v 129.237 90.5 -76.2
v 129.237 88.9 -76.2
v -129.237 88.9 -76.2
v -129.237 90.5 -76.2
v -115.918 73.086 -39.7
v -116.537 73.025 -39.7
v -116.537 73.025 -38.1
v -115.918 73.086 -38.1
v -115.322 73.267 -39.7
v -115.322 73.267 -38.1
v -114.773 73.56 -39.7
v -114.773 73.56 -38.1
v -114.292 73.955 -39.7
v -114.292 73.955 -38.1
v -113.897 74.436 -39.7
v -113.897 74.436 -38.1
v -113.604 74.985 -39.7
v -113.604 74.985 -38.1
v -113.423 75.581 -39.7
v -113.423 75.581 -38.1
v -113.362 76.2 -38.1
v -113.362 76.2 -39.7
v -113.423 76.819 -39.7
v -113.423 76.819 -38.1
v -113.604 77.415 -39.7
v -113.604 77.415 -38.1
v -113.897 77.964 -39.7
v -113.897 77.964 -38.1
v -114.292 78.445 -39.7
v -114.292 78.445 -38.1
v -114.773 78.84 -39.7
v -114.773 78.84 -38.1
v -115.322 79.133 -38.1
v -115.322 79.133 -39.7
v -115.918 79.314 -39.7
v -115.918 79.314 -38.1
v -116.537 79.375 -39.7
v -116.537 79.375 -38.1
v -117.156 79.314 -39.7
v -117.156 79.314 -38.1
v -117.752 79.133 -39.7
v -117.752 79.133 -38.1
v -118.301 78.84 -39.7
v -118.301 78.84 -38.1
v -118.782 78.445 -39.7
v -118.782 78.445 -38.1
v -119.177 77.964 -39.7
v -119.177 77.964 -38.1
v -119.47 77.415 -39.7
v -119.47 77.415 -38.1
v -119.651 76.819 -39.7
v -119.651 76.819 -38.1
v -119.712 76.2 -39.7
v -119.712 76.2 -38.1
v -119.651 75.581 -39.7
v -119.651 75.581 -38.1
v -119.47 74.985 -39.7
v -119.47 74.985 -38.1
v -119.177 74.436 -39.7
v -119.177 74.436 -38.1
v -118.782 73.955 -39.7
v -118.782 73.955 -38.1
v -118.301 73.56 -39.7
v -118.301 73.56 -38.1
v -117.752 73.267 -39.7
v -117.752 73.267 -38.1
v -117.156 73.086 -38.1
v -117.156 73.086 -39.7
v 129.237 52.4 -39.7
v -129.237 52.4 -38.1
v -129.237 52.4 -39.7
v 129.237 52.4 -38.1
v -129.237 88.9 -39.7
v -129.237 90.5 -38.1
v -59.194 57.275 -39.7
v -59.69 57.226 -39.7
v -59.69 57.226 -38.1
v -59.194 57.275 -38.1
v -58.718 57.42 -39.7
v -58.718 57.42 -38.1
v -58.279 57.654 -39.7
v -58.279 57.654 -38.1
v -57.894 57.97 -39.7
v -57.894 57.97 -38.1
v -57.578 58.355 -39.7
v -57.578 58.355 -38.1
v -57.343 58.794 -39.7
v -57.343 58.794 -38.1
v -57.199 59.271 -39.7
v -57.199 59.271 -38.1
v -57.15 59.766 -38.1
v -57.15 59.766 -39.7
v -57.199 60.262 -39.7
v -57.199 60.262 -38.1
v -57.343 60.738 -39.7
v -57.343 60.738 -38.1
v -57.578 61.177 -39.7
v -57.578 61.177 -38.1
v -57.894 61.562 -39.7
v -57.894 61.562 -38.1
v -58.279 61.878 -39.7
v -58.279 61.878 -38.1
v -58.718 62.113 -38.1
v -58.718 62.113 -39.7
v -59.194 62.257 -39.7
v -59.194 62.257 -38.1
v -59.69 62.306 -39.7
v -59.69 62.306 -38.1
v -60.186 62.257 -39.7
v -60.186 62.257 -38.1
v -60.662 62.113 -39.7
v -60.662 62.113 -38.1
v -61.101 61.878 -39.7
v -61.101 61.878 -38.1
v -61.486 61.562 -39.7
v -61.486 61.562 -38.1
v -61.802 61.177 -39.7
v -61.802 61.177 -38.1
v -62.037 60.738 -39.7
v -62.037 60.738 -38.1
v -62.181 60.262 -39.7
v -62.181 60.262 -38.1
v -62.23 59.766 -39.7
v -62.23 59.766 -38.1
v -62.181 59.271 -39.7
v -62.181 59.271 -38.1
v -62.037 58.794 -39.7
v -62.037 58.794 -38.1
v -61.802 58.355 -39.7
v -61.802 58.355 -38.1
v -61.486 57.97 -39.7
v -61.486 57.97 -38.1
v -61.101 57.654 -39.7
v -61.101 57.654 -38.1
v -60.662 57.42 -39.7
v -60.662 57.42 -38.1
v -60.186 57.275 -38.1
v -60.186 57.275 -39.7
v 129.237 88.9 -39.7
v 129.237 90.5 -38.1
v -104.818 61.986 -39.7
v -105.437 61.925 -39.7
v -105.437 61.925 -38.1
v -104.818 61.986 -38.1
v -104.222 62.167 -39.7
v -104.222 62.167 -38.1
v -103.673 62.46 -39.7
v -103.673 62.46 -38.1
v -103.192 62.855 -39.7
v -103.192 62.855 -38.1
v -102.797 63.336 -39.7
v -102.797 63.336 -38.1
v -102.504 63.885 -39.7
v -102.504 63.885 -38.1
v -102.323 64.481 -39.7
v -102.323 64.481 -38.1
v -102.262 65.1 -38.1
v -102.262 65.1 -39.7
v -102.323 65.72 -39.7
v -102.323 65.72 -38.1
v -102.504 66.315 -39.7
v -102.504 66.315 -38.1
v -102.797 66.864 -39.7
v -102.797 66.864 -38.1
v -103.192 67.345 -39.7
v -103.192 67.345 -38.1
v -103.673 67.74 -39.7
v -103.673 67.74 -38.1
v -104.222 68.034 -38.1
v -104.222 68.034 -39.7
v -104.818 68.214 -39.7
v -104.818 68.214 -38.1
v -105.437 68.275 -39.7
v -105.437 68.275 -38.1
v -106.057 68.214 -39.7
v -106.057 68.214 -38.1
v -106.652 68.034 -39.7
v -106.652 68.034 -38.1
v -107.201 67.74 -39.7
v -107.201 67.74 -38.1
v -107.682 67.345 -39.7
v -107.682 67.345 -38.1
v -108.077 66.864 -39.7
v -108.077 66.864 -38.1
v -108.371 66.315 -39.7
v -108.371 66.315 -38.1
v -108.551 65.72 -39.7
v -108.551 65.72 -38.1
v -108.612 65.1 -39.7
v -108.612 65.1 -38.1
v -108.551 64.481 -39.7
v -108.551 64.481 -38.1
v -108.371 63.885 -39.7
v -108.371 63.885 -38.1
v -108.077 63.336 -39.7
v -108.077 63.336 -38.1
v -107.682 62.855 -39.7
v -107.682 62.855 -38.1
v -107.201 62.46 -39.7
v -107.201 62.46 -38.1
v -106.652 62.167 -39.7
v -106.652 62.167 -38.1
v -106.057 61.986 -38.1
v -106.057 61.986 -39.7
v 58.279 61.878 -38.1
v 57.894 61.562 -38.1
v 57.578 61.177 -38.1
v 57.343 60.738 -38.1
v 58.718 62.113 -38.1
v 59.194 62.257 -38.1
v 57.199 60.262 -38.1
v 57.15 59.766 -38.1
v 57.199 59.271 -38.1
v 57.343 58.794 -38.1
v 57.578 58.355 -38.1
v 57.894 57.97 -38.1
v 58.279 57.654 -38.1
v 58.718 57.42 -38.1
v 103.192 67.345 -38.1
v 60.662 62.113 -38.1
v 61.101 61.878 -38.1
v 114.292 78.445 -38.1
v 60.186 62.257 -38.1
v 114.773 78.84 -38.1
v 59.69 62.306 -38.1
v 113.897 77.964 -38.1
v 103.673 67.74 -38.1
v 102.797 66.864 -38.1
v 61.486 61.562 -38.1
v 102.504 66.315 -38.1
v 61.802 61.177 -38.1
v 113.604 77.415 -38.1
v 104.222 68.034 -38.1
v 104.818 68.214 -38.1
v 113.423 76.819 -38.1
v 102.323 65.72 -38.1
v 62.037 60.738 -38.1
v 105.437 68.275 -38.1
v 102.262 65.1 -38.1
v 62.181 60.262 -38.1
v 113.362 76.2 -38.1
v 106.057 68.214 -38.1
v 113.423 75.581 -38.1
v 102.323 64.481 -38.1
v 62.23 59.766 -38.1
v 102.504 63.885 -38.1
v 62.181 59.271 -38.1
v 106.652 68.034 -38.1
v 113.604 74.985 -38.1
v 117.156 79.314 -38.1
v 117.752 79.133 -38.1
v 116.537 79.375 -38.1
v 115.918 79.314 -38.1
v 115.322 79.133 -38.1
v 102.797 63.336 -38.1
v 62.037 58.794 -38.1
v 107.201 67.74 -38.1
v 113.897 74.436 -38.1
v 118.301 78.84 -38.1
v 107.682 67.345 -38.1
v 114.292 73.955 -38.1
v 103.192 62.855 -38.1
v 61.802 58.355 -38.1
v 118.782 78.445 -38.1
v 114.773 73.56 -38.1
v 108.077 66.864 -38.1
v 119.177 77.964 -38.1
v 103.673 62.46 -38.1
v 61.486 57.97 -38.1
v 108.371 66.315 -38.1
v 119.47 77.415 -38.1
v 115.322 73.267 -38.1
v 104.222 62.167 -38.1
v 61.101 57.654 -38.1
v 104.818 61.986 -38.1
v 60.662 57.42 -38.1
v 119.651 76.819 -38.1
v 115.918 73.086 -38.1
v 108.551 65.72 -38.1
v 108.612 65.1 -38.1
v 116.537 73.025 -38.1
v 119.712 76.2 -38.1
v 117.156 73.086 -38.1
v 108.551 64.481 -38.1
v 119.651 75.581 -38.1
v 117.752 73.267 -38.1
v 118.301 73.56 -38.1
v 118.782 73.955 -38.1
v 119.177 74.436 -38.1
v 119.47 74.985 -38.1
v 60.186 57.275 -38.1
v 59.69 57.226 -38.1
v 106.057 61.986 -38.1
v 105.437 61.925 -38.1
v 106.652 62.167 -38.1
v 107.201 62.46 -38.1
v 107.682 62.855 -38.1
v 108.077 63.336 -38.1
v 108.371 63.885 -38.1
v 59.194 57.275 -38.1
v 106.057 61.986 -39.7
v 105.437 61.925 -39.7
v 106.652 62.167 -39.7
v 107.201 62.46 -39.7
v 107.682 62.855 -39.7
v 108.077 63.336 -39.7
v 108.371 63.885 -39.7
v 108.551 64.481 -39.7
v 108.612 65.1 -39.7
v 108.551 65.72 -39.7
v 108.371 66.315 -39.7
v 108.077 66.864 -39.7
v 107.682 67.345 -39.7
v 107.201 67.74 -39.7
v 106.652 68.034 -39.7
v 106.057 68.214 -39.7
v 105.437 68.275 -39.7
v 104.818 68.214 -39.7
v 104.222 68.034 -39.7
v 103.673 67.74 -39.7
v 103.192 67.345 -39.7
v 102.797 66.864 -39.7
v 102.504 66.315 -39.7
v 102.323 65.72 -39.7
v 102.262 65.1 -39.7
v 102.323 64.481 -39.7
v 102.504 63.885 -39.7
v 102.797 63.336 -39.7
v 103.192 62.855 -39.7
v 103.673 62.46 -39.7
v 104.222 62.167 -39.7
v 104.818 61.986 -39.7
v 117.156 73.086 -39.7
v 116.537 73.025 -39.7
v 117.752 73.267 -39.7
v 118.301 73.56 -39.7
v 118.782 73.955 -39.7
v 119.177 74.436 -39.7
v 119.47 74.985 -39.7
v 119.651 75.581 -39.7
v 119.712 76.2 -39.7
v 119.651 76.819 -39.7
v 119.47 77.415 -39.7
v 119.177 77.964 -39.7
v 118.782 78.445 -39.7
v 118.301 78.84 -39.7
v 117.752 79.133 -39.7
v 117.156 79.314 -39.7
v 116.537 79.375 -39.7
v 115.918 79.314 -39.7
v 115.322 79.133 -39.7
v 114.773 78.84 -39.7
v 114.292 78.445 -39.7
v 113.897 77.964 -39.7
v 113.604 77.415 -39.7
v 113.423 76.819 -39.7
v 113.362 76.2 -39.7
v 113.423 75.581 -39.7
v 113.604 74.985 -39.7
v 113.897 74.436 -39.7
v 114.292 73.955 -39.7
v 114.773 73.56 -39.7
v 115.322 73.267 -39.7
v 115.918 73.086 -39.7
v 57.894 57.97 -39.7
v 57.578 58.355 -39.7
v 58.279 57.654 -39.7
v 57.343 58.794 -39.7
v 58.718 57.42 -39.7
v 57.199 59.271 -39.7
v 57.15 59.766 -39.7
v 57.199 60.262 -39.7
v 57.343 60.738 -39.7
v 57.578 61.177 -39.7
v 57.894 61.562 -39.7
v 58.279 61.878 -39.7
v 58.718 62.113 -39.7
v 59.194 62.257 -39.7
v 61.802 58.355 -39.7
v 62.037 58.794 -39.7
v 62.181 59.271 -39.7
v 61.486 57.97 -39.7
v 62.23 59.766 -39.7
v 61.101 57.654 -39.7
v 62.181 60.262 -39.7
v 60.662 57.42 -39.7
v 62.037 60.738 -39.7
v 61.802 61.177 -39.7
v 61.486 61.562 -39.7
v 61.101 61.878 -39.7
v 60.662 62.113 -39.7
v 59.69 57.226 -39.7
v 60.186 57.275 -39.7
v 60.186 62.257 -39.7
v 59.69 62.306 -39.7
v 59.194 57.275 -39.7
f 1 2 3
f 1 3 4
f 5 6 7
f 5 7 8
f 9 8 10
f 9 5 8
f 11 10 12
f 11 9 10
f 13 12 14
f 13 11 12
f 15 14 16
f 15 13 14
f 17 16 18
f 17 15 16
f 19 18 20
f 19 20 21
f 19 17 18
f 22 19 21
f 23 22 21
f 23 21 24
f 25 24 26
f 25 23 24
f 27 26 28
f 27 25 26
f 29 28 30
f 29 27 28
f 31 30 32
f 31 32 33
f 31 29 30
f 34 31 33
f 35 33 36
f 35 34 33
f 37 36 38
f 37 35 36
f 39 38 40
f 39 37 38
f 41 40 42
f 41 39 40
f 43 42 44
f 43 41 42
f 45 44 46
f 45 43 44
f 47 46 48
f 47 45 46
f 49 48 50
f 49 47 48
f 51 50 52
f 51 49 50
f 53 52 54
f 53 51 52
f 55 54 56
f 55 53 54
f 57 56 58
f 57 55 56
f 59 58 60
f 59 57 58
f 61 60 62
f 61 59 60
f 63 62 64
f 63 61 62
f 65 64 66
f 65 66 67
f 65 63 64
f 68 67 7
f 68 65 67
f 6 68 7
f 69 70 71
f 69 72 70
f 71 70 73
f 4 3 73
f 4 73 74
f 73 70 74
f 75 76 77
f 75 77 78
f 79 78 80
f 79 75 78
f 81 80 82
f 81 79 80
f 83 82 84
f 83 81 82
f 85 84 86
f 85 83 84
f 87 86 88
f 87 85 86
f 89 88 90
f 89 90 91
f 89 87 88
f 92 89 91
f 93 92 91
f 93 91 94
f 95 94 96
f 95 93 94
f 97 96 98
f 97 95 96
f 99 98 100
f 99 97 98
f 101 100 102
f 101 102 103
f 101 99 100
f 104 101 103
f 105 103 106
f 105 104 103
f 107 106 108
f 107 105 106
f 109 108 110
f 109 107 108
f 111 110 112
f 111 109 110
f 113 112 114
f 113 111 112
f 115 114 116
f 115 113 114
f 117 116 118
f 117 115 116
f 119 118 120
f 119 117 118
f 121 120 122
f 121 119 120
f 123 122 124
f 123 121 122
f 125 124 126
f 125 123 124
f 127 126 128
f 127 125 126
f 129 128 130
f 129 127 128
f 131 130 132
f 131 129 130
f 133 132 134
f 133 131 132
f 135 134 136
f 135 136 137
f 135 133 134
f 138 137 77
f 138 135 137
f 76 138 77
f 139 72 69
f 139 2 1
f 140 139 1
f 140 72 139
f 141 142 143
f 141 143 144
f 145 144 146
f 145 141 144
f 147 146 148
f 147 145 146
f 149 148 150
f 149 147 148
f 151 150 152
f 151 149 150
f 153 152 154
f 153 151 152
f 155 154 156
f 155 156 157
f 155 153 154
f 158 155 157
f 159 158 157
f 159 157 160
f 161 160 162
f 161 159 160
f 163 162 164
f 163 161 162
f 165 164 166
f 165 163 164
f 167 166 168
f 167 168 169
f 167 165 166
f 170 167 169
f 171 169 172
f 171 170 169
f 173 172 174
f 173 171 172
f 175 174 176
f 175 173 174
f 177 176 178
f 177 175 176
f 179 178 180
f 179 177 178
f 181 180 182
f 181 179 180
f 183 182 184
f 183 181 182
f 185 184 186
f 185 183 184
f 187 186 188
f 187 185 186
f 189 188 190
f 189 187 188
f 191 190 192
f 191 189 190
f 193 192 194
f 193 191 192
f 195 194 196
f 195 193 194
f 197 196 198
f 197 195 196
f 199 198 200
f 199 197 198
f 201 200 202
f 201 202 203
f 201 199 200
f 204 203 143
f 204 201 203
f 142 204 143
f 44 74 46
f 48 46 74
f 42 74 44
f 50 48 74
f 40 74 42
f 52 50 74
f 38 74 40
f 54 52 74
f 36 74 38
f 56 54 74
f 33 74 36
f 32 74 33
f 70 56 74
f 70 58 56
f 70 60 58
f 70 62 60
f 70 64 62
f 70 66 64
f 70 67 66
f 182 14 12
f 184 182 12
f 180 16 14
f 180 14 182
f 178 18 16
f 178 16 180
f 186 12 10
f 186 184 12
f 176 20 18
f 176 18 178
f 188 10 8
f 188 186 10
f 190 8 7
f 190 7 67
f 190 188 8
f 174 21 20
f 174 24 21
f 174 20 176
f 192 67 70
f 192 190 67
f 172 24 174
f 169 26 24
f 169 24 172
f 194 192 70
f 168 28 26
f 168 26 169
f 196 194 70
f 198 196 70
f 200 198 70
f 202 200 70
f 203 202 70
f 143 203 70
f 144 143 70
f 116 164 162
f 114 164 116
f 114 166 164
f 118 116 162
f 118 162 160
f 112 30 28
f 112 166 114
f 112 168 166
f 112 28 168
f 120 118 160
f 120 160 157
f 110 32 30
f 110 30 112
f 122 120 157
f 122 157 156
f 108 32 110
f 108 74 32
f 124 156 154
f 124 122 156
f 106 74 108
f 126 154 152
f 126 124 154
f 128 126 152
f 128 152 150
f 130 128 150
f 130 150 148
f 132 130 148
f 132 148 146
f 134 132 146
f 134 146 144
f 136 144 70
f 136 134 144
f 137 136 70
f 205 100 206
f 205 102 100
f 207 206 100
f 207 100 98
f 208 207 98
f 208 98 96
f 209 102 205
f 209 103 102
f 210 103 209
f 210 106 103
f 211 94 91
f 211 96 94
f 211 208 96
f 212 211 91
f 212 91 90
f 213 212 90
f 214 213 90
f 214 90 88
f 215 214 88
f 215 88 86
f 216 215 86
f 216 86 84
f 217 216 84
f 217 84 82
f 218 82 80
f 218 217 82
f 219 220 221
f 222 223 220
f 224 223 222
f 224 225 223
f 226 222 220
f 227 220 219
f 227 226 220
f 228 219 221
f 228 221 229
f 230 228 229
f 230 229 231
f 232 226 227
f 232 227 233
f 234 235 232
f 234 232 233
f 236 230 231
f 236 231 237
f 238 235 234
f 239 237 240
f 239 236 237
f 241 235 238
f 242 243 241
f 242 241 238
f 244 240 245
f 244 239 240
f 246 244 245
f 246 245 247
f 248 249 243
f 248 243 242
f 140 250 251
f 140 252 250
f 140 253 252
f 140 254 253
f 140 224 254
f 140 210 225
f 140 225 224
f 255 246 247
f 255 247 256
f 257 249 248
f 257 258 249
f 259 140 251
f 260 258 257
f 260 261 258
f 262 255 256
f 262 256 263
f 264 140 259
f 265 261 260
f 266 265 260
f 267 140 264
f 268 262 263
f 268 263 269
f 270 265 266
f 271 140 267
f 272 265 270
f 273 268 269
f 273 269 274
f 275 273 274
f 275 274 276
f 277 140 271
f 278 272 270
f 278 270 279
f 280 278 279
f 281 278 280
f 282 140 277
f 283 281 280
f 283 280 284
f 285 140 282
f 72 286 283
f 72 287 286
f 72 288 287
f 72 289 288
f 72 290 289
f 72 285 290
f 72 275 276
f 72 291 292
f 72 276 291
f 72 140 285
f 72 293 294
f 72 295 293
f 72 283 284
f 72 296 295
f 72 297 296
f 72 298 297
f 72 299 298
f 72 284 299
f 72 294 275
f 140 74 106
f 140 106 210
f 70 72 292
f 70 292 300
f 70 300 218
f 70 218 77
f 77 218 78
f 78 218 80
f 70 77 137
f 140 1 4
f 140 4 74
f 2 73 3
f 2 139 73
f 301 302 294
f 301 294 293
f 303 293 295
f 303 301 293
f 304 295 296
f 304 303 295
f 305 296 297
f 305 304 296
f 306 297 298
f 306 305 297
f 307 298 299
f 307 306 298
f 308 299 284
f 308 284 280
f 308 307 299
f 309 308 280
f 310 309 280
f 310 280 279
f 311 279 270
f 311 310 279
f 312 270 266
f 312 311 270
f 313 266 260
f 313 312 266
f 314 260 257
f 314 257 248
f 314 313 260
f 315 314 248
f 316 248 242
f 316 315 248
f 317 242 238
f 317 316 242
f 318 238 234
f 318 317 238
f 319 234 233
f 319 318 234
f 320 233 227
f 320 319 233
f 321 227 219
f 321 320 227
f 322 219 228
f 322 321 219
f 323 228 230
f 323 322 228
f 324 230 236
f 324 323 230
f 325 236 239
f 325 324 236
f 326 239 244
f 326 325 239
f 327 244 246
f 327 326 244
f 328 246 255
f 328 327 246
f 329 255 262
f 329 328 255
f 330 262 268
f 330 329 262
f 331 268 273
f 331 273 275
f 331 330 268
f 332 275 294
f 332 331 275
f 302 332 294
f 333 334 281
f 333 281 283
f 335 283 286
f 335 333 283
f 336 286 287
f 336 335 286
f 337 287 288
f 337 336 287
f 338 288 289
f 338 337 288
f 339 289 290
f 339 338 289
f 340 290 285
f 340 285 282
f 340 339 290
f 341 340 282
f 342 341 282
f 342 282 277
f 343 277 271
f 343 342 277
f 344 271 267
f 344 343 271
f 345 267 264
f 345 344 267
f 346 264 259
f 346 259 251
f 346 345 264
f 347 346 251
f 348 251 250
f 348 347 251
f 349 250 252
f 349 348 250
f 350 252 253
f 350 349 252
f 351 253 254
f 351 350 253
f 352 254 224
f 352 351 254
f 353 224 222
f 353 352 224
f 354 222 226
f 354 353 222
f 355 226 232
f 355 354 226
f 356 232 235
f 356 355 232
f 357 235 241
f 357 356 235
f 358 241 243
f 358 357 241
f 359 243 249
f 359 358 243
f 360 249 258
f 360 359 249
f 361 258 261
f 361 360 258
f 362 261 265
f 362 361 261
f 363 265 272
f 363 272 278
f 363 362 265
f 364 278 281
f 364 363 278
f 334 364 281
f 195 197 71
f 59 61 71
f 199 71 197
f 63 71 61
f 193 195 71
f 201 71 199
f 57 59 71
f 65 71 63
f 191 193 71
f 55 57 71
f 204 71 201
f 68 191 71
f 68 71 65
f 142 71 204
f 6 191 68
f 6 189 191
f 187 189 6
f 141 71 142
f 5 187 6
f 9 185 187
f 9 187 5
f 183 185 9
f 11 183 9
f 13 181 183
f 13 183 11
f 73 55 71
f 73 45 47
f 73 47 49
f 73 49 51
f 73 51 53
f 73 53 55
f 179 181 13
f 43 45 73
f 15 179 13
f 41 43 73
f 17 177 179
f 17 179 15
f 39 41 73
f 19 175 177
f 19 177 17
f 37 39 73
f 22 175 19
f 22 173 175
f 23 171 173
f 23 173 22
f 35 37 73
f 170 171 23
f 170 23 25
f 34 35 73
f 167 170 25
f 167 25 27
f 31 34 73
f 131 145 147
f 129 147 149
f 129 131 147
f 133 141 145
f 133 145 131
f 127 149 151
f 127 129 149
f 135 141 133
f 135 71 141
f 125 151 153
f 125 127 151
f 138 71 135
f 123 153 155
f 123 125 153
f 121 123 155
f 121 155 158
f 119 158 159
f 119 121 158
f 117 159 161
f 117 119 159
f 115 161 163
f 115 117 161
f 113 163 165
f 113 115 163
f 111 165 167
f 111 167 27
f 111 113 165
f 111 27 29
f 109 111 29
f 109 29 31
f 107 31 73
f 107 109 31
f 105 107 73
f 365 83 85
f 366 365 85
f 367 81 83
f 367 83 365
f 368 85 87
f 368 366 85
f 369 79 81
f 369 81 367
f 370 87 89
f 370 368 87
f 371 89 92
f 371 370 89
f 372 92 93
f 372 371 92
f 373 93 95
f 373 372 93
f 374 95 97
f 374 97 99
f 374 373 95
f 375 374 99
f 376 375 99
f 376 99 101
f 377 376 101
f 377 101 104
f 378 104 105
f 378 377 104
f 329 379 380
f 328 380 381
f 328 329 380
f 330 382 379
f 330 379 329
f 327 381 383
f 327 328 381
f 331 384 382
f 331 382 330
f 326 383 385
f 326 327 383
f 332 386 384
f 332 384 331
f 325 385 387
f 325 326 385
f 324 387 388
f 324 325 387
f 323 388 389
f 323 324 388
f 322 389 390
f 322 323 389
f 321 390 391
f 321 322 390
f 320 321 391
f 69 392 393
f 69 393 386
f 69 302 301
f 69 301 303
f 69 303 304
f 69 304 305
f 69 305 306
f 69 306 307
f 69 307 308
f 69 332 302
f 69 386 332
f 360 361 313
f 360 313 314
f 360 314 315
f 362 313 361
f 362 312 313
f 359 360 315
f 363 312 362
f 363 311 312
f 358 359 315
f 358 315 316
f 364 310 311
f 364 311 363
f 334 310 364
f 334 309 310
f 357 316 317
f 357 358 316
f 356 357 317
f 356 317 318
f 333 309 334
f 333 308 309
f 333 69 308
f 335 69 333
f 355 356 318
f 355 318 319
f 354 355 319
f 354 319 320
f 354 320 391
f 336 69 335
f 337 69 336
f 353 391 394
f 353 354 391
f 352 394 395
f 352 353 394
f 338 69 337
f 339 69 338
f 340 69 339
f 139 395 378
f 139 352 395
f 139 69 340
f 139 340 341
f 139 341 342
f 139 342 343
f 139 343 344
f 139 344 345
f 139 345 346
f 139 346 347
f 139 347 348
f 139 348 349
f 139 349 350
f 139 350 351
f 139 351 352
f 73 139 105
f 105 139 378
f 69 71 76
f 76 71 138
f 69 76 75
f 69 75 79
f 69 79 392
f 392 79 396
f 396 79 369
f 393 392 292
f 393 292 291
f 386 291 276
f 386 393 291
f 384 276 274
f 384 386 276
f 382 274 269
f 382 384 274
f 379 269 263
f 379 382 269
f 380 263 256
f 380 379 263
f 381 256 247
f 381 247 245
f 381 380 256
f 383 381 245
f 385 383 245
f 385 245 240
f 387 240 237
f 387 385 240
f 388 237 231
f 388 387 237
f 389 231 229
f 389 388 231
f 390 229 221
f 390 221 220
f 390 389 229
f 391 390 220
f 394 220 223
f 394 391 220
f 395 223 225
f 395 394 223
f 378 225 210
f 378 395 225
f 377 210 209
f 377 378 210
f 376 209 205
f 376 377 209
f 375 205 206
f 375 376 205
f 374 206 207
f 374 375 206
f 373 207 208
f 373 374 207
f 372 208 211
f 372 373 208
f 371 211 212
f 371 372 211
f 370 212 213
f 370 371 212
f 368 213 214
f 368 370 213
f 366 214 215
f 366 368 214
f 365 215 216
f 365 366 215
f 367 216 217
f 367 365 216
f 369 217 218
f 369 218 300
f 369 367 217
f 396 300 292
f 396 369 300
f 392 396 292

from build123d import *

# Parameters (mm, degrees)
PAD007_DEPTH      = 129.237
PAD007_DEPTH_BACK = 129.237
SKETCH017_R       = 2.54
SKETCH017_R_2     = 3.175
POCKET007_DEPTH   = 1.6002


with BuildPart() as pocket007:
    # Sketch016 → Pad007 (new body, two sides)
    with BuildSketch(Plane(origin=(0, -90.5002, -38.1), x_dir=(0, 1, 0), z_dir=(1, 0, 0))) as pad007_sk:
        Polygon((0, 0), (38.1, 0), (38.1, -1.6002), (1.6002, -1.6002), (1.6002, -38.1), (0, -38.1), align=None)
    extrude(amount=PAD007_DEPTH)
    extrude(pad007_sk.sketch, amount=-PAD007_DEPTH_BACK)

    # Sketch017 → Pocket007 (cut)
    with BuildSketch(Plane(origin=(0, -90.5002, -39.7002), x_dir=(0, 1, 0), z_dir=(0, 0, -1))):
        with Locations((30.734, 59.69)):
            Circle(SKETCH017_R)
        with Locations((30.734, -59.69)):
            Circle(SKETCH017_R)
        with Locations((25.4, -105.4372)):
            Circle(SKETCH017_R_2)
        with Locations((14.3002, -116.537)):
            Circle(SKETCH017_R_2)
        with Locations((14.3002, 116.537)):
            Circle(SKETCH017_R_2)
        with Locations((25.4, 105.4372)):
            Circle(SKETCH017_R_2)
    extrude(amount=-POCKET007_DEPTH, mode=Mode.SUBTRACT)


with BuildPart() as part_mirroring005:
    # Part__Mirroring005: instance of Pocket007
    add(pocket007.part.mirror(Plane(origin=(0, 0, 0), x_dir=(1, 0, 0), z_dir=(0, 1, 0))))


solid = part_mirroring005.part
